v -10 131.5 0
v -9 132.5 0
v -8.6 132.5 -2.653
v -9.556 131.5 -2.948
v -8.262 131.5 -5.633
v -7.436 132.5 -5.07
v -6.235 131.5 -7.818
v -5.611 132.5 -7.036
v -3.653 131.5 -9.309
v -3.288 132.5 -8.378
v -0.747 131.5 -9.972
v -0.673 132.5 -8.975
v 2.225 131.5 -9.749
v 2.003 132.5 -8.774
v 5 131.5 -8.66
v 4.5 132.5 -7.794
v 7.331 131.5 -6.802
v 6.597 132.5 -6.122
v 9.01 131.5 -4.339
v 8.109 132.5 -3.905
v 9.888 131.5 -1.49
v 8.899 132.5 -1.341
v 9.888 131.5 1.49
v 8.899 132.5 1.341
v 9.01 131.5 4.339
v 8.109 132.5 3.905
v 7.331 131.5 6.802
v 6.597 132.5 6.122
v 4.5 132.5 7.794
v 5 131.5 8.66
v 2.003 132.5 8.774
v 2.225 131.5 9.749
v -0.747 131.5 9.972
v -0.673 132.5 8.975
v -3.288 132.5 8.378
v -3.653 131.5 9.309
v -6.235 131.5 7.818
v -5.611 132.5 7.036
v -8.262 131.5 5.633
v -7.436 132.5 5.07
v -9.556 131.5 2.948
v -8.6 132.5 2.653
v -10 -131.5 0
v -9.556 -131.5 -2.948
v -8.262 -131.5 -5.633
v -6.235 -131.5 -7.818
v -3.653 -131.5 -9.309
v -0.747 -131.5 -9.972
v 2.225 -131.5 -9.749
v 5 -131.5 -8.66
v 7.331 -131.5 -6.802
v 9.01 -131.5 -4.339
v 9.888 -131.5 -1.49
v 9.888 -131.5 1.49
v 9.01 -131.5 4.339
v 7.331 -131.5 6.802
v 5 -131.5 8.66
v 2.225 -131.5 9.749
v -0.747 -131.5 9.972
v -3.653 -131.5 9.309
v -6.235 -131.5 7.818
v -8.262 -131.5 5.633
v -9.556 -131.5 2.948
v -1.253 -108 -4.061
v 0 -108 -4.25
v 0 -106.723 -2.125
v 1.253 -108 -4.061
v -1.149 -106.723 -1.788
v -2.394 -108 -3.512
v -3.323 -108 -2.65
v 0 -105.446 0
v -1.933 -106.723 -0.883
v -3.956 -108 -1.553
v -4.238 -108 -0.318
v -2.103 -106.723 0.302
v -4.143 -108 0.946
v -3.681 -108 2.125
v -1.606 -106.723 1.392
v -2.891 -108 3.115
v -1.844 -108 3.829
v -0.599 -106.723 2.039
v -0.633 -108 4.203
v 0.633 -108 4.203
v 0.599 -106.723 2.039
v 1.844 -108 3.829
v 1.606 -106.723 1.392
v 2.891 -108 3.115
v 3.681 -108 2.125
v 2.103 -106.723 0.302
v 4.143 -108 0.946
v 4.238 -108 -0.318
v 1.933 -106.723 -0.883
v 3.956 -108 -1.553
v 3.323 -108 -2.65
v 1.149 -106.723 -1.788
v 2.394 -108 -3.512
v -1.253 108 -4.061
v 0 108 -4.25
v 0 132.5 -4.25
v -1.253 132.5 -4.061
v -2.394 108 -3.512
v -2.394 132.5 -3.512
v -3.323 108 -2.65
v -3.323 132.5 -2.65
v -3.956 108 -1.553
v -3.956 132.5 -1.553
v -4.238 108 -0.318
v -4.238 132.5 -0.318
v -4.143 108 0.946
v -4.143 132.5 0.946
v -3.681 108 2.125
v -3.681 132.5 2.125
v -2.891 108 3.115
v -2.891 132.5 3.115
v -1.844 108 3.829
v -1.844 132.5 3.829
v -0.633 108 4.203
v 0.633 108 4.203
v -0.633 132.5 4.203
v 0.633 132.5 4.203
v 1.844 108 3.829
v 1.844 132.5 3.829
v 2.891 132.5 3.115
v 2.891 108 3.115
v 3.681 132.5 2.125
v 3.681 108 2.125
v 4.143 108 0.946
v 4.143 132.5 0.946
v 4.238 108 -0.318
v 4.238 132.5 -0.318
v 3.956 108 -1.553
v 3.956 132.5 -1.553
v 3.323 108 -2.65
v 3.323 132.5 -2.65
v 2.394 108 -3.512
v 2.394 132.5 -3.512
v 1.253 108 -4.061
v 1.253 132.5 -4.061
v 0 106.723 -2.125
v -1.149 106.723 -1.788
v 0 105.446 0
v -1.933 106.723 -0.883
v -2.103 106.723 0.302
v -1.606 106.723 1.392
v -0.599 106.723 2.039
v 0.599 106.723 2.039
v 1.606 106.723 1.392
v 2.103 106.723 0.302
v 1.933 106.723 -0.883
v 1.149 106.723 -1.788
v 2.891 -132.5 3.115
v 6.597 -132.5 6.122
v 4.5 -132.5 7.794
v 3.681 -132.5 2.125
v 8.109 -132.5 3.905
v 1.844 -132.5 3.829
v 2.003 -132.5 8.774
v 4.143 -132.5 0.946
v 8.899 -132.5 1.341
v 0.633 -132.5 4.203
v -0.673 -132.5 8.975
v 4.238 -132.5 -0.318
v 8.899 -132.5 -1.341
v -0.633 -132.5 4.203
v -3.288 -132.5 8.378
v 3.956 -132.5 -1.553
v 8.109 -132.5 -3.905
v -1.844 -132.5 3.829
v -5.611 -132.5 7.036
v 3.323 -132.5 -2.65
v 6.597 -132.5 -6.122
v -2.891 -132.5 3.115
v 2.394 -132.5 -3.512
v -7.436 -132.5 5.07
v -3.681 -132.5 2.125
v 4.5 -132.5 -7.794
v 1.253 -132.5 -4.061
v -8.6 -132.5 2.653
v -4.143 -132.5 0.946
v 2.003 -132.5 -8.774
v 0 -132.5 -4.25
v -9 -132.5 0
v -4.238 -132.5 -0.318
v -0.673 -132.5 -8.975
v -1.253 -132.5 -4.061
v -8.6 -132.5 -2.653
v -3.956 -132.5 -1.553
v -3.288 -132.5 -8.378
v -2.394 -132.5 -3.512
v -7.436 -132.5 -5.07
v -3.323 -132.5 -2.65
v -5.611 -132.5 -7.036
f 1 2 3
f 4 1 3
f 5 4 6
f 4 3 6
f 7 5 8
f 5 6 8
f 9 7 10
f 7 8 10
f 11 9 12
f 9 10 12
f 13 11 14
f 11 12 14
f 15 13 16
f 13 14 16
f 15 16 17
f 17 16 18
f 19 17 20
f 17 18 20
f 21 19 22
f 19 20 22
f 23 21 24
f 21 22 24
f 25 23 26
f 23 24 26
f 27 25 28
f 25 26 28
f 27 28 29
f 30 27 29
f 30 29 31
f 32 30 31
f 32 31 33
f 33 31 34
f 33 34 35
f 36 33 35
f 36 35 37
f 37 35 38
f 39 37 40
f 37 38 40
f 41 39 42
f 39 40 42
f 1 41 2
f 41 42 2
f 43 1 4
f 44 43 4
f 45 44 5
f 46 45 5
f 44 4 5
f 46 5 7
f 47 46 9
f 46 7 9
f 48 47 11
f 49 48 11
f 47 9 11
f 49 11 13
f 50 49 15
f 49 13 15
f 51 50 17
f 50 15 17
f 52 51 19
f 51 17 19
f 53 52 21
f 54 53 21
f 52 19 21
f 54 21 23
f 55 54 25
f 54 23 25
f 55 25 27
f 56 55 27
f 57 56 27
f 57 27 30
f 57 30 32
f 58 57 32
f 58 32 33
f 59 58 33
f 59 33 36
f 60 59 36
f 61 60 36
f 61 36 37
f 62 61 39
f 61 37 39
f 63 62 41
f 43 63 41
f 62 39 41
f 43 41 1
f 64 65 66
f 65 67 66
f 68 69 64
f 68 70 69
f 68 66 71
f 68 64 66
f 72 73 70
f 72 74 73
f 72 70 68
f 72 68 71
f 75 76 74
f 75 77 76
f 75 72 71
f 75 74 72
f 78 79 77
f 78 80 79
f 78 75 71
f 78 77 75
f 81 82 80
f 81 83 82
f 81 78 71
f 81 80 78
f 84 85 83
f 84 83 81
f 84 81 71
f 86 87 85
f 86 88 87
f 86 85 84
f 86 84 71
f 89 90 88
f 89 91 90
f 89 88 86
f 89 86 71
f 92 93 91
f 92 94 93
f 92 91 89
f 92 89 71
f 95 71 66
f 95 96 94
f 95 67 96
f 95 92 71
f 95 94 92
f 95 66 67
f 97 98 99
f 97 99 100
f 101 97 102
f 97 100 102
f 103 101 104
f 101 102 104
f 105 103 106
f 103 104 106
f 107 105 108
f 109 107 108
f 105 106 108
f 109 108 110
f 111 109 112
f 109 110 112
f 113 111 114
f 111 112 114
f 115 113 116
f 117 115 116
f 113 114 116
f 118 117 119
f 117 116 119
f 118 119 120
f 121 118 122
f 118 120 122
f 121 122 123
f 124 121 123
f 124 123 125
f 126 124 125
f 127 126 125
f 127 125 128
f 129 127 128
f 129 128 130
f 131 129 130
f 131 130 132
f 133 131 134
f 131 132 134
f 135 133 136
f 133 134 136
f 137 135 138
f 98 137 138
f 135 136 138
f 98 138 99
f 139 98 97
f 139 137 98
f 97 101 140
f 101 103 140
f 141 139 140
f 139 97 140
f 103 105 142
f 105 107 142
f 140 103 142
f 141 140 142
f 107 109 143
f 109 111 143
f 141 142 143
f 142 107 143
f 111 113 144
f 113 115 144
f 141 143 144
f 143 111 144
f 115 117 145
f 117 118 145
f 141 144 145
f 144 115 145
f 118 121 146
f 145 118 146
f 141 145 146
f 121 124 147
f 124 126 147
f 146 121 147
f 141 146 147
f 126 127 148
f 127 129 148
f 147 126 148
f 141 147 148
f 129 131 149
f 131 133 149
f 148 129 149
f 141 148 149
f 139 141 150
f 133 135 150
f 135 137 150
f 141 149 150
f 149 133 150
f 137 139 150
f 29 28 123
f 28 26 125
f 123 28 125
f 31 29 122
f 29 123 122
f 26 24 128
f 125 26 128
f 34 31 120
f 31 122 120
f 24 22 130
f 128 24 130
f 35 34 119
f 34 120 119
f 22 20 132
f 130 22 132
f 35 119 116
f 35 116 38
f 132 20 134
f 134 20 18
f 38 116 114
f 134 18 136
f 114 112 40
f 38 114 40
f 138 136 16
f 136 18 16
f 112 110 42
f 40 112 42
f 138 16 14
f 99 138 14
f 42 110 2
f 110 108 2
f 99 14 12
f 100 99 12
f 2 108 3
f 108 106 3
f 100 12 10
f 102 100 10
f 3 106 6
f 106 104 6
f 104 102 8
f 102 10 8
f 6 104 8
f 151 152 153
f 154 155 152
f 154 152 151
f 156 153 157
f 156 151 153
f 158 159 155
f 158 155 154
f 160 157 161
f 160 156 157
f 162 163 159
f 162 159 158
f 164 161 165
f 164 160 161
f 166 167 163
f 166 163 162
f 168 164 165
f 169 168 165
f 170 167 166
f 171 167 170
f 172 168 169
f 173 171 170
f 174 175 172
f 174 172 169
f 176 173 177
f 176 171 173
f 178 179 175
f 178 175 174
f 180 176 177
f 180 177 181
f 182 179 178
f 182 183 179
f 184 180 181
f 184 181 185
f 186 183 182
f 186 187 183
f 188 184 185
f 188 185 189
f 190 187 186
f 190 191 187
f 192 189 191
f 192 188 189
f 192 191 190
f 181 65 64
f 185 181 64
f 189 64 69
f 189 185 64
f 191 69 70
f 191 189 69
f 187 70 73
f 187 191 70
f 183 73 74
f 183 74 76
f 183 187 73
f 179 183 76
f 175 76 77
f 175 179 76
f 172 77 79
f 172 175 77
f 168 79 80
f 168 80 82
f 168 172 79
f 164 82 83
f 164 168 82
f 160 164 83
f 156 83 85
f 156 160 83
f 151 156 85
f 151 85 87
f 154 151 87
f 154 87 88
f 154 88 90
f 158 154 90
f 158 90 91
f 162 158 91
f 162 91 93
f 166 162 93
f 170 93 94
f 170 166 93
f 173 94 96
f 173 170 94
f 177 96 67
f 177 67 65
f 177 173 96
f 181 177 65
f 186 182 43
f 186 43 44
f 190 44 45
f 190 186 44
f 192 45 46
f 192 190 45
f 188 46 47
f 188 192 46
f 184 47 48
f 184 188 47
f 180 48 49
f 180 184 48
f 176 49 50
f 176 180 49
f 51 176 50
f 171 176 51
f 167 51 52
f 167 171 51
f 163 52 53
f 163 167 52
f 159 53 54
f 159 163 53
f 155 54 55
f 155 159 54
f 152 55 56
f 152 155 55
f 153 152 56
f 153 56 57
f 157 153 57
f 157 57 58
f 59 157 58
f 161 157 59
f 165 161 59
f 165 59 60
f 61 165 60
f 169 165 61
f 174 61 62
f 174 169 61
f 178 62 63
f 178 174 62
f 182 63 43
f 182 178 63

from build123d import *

# Parameters (mm, degrees)
SKETCH1_W     = 10
SKETCH1_H     = 265
CHAMFER1_SIZE = 1


with BuildPart() as part:
    # Sketch1 → Revolve2 (revolve)
    with BuildSketch(Plane.XY):
        with Locations((-5, 0)):
            Rectangle(SKETCH1_W, SKETCH1_H)
    revolve(axis=Axis((0, 132.5, 0), (0, -1, 0)))

    # Sketch3 → M10 Tapped Hole1 (revolve, cut)
    with BuildSketch(Plane(origin=(0, -132.5, 0), x_dir=(0, 0, -1), z_dir=(1, 0, 0))):
        Polygon((0, 0), (0, 27.053657631), (4.25, 24.5), (4.25, 0), align=None)
    m10_tapped_hole1 = revolve(axis=Axis((0, -138.85, 0), (0, 1, 0)), mode=Mode.SUBTRACT)

    # Mirror1: M10 Tapped Hole1 across plane
    add(m10_tapped_hole1.mirror(Plane.ZX), mode=Mode.SUBTRACT)

    # Chamfer1
    chamfer1_edges = [part.edges().sort_by_distance(p)[0] for p in [
        (10, -132.5, 0),
        (10, 132.5, 0),
    ]]
    chamfer(chamfer1_edges, length=CHAMFER1_SIZE)


solid = part.part
